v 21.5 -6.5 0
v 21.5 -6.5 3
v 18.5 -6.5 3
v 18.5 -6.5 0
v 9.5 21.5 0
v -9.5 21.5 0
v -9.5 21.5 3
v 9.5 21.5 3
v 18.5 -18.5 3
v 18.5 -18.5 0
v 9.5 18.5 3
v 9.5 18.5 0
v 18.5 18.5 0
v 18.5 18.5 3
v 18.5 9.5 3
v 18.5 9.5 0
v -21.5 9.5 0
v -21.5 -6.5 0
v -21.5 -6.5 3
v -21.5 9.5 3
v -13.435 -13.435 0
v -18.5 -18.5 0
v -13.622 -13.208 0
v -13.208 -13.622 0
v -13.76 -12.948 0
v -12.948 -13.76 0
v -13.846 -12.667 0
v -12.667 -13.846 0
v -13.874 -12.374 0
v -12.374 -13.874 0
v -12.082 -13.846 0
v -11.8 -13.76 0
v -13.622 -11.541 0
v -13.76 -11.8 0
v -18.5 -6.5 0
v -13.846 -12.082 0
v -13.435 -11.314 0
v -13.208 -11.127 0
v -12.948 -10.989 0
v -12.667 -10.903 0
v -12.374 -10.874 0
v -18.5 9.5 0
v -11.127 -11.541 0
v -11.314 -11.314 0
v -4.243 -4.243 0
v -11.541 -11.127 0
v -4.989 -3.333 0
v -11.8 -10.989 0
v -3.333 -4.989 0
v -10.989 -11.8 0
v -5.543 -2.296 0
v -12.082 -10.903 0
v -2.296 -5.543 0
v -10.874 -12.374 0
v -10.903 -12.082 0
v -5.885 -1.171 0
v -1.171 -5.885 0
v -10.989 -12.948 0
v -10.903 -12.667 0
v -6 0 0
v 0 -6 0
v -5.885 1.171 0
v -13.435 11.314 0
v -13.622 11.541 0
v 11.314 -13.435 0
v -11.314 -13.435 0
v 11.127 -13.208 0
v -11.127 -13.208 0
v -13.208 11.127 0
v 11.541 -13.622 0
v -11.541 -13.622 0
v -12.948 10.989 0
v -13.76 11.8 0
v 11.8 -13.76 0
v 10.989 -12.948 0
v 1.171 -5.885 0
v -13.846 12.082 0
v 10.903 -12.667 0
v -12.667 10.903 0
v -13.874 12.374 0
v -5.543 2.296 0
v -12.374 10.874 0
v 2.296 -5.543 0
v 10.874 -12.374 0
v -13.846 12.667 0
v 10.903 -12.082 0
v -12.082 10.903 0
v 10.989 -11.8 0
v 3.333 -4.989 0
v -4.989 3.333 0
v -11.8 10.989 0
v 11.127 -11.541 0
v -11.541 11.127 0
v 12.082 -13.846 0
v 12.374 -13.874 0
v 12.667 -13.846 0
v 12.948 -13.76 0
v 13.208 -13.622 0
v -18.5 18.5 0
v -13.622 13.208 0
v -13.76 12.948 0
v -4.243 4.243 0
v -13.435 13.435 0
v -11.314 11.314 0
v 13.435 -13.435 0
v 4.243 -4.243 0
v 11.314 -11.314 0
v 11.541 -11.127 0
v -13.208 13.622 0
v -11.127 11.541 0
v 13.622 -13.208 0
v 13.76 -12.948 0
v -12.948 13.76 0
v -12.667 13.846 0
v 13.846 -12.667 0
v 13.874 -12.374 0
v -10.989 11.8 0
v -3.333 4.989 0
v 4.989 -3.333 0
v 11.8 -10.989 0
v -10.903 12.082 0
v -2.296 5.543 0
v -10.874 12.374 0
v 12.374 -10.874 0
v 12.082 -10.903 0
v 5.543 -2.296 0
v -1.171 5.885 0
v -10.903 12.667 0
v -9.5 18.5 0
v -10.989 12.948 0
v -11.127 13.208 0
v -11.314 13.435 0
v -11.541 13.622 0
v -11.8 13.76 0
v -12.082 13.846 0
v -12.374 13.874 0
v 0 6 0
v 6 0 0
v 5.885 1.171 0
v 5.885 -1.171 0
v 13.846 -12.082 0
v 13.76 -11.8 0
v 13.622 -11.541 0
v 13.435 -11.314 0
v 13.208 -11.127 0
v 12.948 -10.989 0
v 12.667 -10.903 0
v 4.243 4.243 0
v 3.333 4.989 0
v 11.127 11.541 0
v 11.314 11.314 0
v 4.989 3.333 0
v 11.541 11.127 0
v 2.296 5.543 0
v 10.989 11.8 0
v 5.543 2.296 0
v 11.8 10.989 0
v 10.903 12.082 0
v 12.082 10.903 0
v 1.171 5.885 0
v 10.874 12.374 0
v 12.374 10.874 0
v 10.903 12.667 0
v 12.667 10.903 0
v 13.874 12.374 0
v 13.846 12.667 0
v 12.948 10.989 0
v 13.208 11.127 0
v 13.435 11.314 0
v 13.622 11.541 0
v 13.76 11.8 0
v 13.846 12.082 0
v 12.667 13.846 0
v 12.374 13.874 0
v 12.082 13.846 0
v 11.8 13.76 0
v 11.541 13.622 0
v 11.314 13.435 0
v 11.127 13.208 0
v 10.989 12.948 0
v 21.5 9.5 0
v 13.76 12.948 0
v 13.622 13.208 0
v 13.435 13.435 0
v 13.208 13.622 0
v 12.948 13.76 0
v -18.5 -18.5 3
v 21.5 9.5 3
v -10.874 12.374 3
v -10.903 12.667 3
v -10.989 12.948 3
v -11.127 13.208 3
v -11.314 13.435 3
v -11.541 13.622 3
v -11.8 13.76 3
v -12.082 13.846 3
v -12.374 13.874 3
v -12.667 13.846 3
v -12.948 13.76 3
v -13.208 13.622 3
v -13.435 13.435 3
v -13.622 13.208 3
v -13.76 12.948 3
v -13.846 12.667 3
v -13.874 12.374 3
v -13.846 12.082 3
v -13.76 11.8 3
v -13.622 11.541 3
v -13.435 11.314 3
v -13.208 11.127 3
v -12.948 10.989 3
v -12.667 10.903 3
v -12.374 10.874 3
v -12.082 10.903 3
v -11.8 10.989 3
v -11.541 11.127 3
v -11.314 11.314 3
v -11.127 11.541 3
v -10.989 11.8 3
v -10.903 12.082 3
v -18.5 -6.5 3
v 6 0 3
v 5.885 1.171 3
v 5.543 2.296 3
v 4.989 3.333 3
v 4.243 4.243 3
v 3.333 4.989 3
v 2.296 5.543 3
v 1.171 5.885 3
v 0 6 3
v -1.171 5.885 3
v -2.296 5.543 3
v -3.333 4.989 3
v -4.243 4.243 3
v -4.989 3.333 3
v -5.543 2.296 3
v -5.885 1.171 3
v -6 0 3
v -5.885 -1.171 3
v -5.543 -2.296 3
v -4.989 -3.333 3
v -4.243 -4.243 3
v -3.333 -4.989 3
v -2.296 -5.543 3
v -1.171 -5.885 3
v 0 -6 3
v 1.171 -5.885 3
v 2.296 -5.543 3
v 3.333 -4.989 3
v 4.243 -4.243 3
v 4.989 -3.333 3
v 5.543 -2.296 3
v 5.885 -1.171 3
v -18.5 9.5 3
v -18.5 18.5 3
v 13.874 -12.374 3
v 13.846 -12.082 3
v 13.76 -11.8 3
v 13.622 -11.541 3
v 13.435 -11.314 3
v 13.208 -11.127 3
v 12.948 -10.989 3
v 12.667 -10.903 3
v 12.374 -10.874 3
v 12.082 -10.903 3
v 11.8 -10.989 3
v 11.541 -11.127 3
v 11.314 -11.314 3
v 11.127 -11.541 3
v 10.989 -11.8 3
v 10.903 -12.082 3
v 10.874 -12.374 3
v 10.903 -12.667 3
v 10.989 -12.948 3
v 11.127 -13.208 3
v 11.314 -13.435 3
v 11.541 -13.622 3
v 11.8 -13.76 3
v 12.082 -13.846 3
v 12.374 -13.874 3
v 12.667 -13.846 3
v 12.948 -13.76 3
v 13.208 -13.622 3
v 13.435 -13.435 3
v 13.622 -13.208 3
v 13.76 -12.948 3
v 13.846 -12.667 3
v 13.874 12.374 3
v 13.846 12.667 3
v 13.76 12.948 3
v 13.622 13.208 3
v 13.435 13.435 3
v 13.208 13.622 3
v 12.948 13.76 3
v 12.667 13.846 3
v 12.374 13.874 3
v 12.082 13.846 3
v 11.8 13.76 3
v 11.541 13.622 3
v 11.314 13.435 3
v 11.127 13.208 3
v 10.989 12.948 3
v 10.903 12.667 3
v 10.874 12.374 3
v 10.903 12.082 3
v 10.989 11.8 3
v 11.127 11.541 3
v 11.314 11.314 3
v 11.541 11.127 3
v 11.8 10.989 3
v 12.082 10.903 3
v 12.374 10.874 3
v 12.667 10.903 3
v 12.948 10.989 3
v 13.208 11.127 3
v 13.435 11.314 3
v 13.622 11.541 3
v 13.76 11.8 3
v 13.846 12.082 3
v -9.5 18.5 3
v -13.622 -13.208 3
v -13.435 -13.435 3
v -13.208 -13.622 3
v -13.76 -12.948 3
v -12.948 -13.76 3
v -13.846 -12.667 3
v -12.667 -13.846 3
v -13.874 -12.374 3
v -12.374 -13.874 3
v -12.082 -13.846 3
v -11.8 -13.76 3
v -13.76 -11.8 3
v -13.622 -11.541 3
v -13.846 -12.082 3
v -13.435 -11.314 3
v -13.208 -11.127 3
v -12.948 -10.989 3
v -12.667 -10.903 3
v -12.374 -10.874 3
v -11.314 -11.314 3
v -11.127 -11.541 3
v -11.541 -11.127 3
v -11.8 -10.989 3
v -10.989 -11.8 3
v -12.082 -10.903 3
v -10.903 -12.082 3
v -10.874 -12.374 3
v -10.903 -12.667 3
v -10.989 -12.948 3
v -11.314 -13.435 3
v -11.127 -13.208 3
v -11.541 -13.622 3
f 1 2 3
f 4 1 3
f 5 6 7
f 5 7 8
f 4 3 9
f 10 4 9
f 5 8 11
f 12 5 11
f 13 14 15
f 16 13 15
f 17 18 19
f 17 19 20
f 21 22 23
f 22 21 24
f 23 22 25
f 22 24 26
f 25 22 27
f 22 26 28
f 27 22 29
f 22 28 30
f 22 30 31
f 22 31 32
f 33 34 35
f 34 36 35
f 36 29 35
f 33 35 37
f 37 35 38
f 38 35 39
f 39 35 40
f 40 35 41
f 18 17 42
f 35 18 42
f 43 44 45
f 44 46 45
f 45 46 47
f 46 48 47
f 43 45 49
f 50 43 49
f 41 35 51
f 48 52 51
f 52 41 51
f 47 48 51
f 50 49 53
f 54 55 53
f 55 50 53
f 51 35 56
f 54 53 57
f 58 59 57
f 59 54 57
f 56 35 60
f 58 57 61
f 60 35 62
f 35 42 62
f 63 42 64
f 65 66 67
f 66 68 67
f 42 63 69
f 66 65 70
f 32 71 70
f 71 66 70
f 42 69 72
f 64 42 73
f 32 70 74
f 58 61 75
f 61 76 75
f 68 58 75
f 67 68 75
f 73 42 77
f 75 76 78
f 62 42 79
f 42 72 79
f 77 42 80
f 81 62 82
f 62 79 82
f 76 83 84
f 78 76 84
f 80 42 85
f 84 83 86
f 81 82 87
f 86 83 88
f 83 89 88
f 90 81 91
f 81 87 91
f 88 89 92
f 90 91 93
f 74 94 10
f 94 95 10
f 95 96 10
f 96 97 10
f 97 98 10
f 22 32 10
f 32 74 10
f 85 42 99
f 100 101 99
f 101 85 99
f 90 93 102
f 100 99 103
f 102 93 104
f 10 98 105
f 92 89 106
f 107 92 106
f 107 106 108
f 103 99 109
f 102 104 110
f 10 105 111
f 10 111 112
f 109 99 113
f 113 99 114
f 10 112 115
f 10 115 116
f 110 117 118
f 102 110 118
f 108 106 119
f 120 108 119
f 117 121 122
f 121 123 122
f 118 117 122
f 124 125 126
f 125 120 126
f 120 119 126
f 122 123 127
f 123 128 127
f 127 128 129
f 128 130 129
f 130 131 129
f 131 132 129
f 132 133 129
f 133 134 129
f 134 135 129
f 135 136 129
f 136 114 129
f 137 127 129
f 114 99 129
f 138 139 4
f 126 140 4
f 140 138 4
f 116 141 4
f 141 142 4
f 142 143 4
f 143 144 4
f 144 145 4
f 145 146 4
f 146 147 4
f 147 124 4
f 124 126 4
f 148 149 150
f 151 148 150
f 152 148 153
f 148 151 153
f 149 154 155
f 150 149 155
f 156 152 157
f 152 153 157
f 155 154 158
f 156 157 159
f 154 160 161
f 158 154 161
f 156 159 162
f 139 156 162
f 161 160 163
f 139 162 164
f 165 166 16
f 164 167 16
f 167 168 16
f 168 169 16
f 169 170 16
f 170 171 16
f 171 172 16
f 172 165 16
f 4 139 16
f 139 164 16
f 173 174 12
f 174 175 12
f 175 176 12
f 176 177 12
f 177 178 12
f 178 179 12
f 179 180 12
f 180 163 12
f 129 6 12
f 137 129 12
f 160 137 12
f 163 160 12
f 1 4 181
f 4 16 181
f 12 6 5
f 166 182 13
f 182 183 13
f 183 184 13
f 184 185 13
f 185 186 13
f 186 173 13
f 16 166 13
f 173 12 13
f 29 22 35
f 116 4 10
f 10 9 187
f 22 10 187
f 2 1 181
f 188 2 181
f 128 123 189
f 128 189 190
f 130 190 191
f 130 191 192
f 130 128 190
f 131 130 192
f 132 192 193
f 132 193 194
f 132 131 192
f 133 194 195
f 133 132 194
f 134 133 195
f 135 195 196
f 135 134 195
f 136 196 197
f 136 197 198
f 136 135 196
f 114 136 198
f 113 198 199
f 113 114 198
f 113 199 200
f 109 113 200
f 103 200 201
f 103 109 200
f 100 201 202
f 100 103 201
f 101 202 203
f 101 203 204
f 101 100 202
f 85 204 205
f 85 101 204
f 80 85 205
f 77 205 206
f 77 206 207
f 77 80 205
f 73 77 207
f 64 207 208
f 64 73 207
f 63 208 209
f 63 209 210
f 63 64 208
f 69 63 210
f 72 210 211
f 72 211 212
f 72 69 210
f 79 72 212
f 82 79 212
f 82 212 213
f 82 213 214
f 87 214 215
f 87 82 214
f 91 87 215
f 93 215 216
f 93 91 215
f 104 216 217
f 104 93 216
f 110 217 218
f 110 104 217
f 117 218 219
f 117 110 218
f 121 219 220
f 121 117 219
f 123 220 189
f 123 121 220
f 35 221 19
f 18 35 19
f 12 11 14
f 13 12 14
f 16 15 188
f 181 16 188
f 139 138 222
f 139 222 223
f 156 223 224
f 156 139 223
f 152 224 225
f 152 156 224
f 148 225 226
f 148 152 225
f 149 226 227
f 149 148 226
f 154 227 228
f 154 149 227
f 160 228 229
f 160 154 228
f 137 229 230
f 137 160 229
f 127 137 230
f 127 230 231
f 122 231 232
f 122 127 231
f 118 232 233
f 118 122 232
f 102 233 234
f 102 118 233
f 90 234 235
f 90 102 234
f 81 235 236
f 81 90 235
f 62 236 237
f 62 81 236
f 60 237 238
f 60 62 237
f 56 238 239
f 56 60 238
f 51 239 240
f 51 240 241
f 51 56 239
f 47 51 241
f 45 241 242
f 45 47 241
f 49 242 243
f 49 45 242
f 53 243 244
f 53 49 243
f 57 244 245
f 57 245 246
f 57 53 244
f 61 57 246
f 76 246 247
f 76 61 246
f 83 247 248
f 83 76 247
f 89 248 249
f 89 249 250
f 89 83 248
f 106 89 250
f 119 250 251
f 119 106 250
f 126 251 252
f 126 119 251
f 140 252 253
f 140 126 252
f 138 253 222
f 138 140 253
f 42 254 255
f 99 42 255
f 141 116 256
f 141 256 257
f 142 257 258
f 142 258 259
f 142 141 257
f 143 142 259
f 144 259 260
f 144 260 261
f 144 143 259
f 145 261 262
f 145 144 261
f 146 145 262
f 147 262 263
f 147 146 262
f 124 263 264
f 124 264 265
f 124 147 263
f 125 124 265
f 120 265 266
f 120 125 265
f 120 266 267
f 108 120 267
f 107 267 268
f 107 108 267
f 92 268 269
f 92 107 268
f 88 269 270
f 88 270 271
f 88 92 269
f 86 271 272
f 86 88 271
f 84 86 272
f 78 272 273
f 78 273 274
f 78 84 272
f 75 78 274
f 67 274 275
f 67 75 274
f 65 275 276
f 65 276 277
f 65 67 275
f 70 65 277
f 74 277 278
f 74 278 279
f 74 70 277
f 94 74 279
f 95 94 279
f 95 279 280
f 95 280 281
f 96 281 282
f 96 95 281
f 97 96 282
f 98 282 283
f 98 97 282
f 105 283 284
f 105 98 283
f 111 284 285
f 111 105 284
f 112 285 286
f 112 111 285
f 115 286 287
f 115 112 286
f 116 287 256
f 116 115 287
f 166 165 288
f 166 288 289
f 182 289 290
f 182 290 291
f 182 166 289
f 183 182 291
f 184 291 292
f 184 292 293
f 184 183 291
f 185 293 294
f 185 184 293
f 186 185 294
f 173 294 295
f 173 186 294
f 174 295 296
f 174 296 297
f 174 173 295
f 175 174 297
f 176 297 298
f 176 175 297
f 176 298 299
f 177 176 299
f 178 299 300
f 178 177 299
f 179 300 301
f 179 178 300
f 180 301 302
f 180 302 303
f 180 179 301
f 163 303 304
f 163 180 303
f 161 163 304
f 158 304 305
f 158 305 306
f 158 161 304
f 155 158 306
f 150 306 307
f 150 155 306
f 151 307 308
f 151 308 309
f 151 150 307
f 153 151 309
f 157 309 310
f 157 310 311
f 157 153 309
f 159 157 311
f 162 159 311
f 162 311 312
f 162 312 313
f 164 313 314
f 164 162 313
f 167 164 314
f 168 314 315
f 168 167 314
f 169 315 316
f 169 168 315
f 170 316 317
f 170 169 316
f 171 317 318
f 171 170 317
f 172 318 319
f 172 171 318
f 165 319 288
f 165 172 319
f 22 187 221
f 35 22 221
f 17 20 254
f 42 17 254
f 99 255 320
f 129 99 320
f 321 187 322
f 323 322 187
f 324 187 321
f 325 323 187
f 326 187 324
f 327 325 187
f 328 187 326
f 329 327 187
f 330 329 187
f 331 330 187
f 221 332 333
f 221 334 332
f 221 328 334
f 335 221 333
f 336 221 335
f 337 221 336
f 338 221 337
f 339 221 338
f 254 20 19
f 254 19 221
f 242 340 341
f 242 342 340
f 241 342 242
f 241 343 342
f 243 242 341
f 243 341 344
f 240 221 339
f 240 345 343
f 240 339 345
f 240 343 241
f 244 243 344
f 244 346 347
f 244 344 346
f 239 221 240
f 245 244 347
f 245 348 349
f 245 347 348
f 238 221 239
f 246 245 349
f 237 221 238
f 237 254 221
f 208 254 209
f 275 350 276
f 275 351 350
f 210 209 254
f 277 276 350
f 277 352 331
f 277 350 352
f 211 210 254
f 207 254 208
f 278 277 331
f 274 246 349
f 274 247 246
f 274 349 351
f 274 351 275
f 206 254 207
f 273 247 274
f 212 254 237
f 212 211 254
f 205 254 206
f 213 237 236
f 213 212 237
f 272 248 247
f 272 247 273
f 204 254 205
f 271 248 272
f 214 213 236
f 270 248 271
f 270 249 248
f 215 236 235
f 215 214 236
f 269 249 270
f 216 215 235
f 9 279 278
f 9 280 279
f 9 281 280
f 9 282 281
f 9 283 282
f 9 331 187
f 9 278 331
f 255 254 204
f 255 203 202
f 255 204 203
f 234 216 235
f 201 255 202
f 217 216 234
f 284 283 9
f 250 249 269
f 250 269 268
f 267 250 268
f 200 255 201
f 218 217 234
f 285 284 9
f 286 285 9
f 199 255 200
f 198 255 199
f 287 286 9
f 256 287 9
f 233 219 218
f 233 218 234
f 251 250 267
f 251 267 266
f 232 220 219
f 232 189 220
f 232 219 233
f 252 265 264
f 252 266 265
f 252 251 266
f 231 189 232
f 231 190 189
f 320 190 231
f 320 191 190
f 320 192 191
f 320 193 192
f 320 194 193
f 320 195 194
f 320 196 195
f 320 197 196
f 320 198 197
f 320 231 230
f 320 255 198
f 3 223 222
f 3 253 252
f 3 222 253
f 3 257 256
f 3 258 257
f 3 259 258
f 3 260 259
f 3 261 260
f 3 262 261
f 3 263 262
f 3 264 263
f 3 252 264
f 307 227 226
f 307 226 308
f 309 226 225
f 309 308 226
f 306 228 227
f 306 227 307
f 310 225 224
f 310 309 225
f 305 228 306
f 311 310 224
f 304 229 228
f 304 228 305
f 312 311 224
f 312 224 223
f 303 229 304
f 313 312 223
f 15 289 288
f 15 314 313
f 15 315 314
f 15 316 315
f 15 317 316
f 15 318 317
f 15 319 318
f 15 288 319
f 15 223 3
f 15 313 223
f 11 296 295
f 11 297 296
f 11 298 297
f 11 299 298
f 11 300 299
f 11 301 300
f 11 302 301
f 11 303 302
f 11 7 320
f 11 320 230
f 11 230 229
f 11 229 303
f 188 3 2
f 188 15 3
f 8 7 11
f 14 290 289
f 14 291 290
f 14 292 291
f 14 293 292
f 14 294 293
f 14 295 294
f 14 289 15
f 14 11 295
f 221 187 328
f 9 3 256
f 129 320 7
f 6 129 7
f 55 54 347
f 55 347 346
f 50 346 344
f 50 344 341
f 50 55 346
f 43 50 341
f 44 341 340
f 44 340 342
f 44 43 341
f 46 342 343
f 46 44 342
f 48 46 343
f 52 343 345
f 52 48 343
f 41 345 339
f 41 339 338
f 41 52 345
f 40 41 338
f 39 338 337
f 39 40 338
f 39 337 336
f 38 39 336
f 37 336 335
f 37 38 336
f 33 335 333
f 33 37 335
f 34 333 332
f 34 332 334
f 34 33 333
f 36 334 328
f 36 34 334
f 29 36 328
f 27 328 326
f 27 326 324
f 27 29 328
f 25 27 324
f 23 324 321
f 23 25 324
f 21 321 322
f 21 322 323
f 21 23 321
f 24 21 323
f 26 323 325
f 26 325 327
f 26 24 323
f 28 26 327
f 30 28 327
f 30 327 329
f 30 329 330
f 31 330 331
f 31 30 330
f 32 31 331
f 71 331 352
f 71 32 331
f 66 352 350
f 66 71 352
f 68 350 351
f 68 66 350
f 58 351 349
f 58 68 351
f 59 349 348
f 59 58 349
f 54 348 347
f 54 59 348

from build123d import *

# Parameters (mm, degrees)
SKETCH1_W           = 43
SKETCH1_H           = 43
SKETCH1_R           = 1.5
SKETCH1_R_2         = 6
BOSS_EXTRUDE1_DEPTH = 3
CUT_EXTRUDE1_DEPTH  = 3


with BuildPart() as part:
    # Sketch1 → Boss-Extrude1 (new body)
    with BuildSketch(Plane.XY):
        Rectangle(SKETCH1_W, SKETCH1_H)
        with Locations((-12.374368671, 12.374368671)):
            Circle(SKETCH1_R, mode=Mode.SUBTRACT)
        with Locations((12.374368671, -12.374368671)):
            Circle(SKETCH1_R, mode=Mode.SUBTRACT)
        with Locations((12.374368671, 12.374368671)):
            Circle(SKETCH1_R, mode=Mode.SUBTRACT)
        with Locations((-12.374368671, -12.374368671)):
            Circle(SKETCH1_R, mode=Mode.SUBTRACT)
        Circle(SKETCH1_R_2, mode=Mode.SUBTRACT)
    extrude(amount=BOSS_EXTRUDE1_DEPTH)

    # Sketch2 → Cut-Extrude1 (cut)
    with BuildSketch(Plane.XY.offset(3)):
        Polygon((-21.5, -21.5), (21.5, -21.5), (21.5, -18.5), (21.5, -6.5), (18.5, -6.5), (18.5, -18.5), (-18.5, -18.5), (-18.5, -6.5), (-21.5, -6.5), (-21.5, -18.5), align=None)
        Polygon((-21.5, 9.5), (-18.5, 9.5), (-18.5, 18.5), (-9.5, 18.5), (-9.5, 21.5), (-21.5, 21.5), align=None)
        Polygon((21.5, 9.5), (21.5, 21.5), (9.5, 21.5), (9.5, 18.5), (18.5, 18.5), (18.5, 9.5), align=None)
    extrude(amount=-CUT_EXTRUDE1_DEPTH, mode=Mode.SUBTRACT)


solid = part.part
